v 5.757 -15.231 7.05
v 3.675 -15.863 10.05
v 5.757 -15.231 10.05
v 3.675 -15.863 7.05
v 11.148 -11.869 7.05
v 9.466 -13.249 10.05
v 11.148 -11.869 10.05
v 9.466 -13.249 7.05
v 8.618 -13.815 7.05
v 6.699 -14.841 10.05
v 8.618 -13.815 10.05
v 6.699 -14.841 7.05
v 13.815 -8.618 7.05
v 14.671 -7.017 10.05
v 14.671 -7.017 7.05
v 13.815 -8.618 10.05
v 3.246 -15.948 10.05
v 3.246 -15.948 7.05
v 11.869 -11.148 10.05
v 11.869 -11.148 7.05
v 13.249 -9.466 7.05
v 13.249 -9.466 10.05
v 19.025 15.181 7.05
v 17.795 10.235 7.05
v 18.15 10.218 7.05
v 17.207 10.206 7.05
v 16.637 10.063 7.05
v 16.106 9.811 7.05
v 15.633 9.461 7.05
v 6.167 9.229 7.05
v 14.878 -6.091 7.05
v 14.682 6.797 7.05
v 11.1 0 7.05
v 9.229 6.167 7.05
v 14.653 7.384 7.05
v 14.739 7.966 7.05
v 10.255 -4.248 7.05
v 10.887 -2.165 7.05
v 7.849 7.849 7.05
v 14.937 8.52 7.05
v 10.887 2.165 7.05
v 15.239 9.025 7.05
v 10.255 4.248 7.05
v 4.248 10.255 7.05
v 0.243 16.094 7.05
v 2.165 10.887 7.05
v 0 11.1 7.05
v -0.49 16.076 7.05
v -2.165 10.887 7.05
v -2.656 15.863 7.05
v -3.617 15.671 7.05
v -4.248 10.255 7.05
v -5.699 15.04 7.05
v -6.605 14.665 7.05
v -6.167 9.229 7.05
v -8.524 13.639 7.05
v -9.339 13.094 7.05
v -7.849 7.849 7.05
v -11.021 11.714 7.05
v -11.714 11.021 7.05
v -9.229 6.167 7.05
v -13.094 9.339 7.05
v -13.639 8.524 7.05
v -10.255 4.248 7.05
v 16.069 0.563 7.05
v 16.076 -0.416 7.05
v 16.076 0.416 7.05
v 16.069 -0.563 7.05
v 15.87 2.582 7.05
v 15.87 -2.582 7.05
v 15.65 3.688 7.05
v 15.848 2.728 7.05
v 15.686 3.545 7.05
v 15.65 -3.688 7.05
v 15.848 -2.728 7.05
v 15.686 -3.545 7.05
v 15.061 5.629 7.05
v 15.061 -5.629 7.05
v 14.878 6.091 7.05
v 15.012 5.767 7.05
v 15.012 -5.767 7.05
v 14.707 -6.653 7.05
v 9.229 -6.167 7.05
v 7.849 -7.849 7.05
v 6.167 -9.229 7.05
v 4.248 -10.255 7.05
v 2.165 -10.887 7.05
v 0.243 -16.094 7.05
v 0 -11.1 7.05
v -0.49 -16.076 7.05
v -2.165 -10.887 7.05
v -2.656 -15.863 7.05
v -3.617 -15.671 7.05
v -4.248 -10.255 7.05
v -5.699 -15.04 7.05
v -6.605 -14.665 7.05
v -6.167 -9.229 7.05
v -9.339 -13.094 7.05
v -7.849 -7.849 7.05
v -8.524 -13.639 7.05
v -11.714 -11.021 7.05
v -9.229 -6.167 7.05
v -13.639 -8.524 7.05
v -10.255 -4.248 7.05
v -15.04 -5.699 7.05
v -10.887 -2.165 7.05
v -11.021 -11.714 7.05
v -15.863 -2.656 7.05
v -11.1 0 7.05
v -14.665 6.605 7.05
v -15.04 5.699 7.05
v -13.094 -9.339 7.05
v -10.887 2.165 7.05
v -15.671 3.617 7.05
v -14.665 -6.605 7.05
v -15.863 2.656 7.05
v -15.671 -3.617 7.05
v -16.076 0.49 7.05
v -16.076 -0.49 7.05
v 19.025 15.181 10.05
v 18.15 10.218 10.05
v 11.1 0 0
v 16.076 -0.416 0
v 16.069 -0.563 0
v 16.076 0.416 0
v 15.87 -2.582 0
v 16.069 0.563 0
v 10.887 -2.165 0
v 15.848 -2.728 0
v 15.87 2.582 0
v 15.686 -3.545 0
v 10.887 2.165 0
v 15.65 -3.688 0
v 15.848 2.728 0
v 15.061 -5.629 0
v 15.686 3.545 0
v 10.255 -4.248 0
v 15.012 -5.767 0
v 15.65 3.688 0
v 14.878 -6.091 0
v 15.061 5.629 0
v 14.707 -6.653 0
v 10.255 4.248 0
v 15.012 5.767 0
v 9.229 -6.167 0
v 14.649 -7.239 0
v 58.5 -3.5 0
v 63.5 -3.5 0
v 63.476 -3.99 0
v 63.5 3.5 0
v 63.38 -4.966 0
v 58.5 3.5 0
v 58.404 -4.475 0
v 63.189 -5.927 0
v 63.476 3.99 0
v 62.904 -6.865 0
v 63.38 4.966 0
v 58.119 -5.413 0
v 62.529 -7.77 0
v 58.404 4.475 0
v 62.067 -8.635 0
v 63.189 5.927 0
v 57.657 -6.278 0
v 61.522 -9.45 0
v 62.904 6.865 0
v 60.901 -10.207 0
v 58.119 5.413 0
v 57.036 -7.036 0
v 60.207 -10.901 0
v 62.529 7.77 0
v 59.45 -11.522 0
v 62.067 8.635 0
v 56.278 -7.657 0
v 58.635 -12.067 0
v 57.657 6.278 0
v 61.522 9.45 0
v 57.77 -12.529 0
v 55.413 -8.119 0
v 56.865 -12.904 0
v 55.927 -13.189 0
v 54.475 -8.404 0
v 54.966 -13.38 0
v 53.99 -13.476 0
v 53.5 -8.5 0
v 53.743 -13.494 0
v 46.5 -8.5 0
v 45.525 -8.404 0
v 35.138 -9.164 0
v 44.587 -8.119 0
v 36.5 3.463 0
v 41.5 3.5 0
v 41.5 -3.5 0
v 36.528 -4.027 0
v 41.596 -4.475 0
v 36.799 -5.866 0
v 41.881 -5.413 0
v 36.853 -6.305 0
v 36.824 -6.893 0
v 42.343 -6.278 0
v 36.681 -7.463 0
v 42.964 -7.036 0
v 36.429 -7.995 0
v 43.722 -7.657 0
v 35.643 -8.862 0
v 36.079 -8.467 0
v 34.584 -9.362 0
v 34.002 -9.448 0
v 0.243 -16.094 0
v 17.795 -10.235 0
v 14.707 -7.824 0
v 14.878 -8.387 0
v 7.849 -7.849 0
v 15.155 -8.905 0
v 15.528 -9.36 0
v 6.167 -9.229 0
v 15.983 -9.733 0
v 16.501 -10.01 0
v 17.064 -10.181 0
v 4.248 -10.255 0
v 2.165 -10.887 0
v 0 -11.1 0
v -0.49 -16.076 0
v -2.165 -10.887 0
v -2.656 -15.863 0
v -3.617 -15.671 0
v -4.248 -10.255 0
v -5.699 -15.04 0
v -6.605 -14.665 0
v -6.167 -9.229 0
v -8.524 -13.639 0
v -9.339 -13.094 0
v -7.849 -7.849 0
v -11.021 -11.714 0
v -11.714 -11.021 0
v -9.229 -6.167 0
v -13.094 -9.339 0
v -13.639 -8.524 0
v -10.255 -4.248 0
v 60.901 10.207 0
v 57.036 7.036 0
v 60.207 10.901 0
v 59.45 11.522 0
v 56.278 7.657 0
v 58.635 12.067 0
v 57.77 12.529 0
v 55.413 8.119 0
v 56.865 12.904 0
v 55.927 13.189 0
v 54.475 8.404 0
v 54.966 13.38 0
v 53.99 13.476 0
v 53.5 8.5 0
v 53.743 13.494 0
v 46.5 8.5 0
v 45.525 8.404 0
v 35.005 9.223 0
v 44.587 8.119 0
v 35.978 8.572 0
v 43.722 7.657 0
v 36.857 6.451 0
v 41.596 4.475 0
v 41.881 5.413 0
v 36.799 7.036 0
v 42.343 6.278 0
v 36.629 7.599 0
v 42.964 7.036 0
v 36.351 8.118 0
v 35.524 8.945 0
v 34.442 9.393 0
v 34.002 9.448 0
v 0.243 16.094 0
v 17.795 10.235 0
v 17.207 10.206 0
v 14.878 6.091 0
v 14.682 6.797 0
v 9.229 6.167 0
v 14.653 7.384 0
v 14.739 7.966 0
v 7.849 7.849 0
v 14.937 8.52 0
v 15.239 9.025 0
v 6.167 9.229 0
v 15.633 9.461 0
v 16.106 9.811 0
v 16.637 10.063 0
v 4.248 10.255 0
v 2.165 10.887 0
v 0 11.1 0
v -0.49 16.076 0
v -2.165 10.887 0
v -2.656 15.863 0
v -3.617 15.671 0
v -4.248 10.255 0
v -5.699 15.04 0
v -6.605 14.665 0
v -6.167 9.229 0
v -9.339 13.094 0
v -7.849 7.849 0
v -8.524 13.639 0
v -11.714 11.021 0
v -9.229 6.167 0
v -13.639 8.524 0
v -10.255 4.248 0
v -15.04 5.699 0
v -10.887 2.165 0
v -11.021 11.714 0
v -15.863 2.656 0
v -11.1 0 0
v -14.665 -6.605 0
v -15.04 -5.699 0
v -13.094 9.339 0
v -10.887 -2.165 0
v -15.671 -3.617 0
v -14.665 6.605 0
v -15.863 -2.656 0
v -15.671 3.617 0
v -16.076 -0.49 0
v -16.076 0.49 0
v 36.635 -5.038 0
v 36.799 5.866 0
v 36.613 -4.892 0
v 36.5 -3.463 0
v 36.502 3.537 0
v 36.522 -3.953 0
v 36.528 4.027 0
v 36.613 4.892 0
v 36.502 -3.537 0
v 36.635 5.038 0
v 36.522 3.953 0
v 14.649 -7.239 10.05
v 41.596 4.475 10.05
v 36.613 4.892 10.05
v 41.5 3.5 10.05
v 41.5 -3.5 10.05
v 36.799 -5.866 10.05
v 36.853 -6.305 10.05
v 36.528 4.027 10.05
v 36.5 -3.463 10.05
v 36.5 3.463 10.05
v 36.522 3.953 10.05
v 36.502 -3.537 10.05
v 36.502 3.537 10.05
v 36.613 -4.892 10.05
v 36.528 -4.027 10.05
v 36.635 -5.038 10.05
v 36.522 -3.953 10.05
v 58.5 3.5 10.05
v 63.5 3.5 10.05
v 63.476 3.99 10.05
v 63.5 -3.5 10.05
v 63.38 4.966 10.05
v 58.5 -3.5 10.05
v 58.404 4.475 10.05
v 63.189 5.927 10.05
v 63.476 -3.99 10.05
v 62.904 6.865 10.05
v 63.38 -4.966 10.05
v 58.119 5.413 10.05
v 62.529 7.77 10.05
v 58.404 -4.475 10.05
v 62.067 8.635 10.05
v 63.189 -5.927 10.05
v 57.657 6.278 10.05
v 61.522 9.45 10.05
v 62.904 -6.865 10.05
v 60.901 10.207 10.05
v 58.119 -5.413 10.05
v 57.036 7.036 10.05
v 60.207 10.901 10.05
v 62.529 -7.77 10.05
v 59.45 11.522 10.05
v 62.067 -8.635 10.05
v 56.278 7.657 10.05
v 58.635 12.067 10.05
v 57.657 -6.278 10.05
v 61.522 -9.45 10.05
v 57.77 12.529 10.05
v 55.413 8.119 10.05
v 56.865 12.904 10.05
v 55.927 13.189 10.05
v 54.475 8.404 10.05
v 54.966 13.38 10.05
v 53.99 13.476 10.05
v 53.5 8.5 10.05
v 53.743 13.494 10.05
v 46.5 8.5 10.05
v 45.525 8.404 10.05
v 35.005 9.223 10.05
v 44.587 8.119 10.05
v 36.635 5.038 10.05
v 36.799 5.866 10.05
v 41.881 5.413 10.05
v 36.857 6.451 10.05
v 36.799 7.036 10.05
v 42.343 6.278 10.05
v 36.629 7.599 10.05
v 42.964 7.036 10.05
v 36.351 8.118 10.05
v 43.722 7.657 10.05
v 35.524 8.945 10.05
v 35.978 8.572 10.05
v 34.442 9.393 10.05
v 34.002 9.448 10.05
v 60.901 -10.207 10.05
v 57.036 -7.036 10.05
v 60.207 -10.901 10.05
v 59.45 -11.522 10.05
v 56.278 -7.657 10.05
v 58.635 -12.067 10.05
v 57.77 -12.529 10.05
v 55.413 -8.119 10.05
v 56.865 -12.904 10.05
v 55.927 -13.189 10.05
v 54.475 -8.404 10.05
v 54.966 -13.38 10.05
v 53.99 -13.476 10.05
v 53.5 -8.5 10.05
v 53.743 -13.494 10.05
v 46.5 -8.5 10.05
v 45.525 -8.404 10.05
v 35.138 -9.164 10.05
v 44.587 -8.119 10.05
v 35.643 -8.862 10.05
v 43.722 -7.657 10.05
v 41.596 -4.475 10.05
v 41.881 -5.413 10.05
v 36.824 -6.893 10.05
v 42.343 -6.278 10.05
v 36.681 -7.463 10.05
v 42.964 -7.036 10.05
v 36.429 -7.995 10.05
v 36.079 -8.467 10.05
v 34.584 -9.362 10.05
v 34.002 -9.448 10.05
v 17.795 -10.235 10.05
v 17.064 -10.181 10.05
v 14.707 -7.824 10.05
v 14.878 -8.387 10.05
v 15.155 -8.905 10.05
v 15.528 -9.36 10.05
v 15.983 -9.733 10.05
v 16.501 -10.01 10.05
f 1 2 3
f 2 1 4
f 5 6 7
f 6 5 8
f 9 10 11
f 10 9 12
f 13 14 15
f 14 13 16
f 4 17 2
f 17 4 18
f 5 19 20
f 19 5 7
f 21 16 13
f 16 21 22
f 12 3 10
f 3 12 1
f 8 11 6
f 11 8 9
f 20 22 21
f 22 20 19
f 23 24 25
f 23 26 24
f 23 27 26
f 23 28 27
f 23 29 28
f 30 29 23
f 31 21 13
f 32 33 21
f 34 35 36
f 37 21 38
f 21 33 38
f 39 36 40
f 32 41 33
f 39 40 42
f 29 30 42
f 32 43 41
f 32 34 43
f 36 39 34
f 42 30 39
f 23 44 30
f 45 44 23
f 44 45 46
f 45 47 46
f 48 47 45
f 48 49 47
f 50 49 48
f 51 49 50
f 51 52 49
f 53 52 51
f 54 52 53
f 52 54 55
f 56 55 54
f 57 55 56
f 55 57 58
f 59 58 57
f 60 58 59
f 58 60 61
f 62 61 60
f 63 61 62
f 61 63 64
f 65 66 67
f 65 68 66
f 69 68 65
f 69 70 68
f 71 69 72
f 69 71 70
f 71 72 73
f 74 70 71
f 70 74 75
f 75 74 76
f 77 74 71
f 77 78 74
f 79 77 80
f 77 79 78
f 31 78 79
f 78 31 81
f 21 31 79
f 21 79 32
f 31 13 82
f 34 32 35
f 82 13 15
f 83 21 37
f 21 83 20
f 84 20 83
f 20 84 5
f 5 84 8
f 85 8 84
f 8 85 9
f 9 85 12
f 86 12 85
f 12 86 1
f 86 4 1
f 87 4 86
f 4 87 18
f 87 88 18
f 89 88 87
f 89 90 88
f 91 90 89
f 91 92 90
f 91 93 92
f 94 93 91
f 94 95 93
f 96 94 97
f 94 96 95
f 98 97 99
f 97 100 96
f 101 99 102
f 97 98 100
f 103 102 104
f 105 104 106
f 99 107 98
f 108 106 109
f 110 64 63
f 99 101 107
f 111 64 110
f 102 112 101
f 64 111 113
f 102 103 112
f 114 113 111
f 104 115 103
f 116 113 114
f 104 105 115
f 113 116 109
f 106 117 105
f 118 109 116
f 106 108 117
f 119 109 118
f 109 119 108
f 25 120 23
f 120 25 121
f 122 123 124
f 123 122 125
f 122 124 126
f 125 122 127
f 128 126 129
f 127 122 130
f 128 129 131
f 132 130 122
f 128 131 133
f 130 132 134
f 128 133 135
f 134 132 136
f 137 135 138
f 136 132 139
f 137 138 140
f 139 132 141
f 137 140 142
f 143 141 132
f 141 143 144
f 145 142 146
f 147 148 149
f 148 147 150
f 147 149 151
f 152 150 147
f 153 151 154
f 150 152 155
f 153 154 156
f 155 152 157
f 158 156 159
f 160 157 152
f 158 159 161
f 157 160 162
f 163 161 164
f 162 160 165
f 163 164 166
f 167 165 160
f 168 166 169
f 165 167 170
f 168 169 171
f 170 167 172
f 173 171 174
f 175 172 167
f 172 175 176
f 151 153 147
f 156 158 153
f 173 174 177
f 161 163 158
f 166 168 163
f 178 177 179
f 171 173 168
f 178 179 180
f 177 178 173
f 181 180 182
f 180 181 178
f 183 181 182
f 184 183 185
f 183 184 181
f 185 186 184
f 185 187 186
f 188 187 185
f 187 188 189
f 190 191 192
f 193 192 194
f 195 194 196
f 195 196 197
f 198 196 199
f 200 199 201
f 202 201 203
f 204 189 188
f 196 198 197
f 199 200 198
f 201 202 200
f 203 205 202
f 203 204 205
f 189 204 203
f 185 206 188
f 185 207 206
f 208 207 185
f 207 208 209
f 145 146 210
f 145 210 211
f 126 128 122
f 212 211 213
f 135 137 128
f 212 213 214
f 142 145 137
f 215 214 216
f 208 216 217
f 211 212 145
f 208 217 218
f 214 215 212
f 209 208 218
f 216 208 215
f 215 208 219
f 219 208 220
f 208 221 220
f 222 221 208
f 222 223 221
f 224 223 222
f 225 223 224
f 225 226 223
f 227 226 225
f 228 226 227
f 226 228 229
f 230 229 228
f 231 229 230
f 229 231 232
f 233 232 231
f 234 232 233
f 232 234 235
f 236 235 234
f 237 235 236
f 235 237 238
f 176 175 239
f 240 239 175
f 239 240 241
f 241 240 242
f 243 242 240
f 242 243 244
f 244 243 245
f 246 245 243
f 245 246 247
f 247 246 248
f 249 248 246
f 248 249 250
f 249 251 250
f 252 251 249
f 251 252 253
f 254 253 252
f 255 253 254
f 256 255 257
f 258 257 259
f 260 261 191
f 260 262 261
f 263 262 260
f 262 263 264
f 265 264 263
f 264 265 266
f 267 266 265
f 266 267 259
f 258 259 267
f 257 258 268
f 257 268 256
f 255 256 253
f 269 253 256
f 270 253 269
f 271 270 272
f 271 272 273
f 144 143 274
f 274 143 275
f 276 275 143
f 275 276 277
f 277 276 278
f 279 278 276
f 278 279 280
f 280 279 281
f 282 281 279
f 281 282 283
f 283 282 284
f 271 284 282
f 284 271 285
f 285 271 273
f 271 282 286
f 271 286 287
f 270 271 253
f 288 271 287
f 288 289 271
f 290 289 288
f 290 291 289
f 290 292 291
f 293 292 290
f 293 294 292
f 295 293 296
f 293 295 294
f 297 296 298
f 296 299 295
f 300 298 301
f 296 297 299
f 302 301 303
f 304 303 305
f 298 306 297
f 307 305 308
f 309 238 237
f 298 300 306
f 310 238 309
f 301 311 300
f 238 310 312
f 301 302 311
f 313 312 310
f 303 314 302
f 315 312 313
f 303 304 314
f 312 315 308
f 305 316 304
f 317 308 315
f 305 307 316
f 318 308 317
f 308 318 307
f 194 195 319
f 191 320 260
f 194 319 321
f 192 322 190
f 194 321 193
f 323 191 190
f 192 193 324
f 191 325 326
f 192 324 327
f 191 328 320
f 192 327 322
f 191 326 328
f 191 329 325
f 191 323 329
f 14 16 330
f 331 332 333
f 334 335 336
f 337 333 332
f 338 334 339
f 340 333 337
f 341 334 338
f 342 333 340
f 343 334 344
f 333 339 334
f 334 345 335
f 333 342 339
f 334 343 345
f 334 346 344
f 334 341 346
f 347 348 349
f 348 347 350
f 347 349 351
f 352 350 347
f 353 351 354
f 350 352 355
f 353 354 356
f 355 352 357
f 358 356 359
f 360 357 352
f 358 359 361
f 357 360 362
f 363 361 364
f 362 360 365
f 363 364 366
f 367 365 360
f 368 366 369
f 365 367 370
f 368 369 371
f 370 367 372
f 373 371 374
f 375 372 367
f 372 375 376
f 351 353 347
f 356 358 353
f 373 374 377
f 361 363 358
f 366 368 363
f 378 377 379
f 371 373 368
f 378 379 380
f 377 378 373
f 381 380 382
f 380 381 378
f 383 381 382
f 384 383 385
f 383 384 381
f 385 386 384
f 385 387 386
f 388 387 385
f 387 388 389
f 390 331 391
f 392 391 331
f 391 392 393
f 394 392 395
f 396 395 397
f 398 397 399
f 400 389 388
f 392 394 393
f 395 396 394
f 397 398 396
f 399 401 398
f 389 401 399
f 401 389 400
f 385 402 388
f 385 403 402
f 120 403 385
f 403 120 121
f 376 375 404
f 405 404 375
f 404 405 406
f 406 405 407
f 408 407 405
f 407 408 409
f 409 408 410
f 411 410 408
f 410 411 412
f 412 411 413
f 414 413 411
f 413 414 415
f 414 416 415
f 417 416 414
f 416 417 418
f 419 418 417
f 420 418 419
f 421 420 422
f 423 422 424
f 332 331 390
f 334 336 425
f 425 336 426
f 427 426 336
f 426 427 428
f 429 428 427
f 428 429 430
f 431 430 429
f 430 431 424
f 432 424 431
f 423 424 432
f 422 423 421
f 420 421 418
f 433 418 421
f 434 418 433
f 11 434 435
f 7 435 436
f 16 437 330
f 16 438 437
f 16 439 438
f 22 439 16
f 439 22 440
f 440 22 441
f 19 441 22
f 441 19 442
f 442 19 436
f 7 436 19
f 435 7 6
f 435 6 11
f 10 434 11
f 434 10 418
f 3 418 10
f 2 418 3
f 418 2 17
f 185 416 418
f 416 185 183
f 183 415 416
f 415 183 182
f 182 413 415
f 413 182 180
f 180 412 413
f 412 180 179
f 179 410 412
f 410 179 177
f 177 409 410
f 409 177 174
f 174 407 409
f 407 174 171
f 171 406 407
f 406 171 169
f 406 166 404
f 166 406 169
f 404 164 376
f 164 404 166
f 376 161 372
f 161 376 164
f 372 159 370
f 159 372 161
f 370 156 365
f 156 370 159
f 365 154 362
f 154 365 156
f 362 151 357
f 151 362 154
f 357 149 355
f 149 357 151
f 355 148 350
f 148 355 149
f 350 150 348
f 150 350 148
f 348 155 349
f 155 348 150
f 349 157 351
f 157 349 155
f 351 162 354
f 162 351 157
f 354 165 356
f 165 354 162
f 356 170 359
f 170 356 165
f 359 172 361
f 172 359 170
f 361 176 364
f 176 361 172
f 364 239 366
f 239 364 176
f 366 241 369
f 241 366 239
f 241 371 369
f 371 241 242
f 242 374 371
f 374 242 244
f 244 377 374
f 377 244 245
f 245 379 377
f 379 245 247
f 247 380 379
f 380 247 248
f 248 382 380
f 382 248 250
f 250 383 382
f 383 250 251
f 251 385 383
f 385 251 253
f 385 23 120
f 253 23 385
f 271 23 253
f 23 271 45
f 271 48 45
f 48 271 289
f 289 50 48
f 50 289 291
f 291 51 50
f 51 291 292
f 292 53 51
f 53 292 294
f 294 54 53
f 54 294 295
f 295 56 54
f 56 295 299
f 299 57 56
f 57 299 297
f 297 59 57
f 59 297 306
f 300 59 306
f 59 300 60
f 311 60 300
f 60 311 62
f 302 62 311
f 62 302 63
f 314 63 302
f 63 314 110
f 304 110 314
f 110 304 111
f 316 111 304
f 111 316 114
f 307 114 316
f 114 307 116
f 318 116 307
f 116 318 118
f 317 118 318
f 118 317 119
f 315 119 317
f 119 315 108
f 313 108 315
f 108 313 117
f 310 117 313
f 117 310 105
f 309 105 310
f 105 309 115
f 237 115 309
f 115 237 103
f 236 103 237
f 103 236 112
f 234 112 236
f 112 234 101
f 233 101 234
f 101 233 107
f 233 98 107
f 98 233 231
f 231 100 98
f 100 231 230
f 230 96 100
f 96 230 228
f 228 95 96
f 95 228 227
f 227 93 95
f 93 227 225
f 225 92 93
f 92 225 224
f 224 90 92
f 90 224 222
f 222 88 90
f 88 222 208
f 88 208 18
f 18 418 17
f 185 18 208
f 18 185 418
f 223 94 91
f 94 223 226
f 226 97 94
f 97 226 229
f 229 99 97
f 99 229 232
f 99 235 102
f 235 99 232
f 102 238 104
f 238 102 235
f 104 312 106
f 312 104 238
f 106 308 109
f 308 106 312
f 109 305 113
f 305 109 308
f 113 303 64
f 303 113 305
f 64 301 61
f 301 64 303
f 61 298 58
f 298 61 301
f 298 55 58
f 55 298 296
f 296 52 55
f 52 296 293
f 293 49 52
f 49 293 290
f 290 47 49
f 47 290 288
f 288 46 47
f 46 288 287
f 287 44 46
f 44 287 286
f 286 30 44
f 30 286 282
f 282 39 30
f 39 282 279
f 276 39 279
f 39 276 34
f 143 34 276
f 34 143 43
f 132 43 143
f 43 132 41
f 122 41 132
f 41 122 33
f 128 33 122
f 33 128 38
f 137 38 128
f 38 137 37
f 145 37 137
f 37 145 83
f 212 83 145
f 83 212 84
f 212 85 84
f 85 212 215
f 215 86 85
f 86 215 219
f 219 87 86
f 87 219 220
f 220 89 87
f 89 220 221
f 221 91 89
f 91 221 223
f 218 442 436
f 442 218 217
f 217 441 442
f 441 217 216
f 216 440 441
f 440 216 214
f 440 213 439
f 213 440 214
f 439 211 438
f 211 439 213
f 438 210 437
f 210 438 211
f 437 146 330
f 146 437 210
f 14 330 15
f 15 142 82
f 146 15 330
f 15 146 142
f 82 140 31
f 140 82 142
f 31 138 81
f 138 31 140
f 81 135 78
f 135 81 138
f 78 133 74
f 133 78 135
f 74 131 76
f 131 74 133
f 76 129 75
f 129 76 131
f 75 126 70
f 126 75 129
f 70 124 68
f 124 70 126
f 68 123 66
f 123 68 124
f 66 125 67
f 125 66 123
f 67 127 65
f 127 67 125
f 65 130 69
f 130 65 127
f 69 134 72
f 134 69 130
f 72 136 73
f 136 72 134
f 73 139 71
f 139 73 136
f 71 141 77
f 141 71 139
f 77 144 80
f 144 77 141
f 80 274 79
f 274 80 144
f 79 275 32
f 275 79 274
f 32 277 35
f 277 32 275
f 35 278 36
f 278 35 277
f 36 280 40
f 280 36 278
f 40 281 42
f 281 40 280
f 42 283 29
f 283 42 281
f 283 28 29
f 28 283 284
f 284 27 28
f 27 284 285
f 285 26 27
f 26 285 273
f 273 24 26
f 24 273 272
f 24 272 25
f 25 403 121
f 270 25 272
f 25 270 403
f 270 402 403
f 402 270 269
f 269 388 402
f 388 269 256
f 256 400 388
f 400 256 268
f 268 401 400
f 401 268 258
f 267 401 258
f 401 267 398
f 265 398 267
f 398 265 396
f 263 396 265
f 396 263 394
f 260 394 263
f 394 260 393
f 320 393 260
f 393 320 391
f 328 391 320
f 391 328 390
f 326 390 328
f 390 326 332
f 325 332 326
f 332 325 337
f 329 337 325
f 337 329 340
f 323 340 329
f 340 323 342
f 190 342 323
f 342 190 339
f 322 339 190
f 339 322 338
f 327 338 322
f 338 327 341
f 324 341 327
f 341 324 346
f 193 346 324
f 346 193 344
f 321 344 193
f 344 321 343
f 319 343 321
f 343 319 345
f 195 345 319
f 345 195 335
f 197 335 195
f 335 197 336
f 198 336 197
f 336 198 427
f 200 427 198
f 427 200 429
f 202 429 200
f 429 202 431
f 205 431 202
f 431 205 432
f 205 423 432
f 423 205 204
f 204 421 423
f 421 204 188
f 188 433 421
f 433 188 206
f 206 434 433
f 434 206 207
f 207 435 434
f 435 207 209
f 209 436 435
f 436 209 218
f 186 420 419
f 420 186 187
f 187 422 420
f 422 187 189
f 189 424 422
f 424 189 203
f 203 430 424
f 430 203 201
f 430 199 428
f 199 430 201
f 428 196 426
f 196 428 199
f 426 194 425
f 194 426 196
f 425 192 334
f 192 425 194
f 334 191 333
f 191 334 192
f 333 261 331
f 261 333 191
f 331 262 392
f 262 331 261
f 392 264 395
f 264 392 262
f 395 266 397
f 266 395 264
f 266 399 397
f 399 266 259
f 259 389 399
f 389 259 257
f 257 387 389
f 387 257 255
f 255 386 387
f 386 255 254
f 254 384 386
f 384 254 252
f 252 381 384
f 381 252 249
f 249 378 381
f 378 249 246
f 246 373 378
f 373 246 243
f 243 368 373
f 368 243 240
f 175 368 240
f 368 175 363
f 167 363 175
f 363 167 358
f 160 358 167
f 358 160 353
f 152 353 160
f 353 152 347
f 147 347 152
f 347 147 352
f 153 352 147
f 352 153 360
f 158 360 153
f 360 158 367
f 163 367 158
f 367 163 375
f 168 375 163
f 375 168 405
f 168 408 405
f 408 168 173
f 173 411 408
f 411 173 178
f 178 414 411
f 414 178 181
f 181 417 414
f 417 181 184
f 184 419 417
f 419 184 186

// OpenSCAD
// 20-gauge wire bender

$fn = 32;

wire_dia = 2.0; // With insulation
handle_len = 50.0; // Each part of the V
handle_wid = 22.0; // At base
handle_thick = 3.0; // Thickness *excluding* bearing height
border_thick = 5.0; // Thickness around holes
riser_thick = 3.0; // Thickness of stress risers/rounding
spacing = 0.2;

// Roller bearing params
bearing_inner_dia = 7.9;
bearing_outer_dia = 22.2;
bearing_h = 7.05;

module bender_out_holes() {
    circle(d=bearing_outer_dia);
    translate([handle_len,0])
    rotate([0,0,90])
    offset(border_thick) offset(-border_thick)
    square(handle_wid-border_thick, center=true);
}

module bender_out_outline() {
    difference() {
        offset(border_thick)
        hull() bender_out_holes();
        bender_out_holes();
    }
}

module bender_out_light() {
    difference() {
        bender_out_outline();
        offset(riser_thick) offset(-riser_thick)
        offset(-border_thick)
        bender_out_outline();
    }
}

module bender_out_3d() {
    difference() {
    linear_extrude(bearing_h+handle_thick)
    bender_out_light();
    translate([0,0,bearing_h]) {
        linear_extrude(handle_thick+spacing)
        offset(border_thick+spacing)
        circle(d=bearing_outer_dia, $fn=32);
        rotate([0,0,-10])
        #linear_extrude(handle_thick+0.01)
        square([bearing_outer_dia/2+border_thick,bearing_outer_dia/2+border_thick+3], center=false);
    }
    }
}

bender_out_3d();
